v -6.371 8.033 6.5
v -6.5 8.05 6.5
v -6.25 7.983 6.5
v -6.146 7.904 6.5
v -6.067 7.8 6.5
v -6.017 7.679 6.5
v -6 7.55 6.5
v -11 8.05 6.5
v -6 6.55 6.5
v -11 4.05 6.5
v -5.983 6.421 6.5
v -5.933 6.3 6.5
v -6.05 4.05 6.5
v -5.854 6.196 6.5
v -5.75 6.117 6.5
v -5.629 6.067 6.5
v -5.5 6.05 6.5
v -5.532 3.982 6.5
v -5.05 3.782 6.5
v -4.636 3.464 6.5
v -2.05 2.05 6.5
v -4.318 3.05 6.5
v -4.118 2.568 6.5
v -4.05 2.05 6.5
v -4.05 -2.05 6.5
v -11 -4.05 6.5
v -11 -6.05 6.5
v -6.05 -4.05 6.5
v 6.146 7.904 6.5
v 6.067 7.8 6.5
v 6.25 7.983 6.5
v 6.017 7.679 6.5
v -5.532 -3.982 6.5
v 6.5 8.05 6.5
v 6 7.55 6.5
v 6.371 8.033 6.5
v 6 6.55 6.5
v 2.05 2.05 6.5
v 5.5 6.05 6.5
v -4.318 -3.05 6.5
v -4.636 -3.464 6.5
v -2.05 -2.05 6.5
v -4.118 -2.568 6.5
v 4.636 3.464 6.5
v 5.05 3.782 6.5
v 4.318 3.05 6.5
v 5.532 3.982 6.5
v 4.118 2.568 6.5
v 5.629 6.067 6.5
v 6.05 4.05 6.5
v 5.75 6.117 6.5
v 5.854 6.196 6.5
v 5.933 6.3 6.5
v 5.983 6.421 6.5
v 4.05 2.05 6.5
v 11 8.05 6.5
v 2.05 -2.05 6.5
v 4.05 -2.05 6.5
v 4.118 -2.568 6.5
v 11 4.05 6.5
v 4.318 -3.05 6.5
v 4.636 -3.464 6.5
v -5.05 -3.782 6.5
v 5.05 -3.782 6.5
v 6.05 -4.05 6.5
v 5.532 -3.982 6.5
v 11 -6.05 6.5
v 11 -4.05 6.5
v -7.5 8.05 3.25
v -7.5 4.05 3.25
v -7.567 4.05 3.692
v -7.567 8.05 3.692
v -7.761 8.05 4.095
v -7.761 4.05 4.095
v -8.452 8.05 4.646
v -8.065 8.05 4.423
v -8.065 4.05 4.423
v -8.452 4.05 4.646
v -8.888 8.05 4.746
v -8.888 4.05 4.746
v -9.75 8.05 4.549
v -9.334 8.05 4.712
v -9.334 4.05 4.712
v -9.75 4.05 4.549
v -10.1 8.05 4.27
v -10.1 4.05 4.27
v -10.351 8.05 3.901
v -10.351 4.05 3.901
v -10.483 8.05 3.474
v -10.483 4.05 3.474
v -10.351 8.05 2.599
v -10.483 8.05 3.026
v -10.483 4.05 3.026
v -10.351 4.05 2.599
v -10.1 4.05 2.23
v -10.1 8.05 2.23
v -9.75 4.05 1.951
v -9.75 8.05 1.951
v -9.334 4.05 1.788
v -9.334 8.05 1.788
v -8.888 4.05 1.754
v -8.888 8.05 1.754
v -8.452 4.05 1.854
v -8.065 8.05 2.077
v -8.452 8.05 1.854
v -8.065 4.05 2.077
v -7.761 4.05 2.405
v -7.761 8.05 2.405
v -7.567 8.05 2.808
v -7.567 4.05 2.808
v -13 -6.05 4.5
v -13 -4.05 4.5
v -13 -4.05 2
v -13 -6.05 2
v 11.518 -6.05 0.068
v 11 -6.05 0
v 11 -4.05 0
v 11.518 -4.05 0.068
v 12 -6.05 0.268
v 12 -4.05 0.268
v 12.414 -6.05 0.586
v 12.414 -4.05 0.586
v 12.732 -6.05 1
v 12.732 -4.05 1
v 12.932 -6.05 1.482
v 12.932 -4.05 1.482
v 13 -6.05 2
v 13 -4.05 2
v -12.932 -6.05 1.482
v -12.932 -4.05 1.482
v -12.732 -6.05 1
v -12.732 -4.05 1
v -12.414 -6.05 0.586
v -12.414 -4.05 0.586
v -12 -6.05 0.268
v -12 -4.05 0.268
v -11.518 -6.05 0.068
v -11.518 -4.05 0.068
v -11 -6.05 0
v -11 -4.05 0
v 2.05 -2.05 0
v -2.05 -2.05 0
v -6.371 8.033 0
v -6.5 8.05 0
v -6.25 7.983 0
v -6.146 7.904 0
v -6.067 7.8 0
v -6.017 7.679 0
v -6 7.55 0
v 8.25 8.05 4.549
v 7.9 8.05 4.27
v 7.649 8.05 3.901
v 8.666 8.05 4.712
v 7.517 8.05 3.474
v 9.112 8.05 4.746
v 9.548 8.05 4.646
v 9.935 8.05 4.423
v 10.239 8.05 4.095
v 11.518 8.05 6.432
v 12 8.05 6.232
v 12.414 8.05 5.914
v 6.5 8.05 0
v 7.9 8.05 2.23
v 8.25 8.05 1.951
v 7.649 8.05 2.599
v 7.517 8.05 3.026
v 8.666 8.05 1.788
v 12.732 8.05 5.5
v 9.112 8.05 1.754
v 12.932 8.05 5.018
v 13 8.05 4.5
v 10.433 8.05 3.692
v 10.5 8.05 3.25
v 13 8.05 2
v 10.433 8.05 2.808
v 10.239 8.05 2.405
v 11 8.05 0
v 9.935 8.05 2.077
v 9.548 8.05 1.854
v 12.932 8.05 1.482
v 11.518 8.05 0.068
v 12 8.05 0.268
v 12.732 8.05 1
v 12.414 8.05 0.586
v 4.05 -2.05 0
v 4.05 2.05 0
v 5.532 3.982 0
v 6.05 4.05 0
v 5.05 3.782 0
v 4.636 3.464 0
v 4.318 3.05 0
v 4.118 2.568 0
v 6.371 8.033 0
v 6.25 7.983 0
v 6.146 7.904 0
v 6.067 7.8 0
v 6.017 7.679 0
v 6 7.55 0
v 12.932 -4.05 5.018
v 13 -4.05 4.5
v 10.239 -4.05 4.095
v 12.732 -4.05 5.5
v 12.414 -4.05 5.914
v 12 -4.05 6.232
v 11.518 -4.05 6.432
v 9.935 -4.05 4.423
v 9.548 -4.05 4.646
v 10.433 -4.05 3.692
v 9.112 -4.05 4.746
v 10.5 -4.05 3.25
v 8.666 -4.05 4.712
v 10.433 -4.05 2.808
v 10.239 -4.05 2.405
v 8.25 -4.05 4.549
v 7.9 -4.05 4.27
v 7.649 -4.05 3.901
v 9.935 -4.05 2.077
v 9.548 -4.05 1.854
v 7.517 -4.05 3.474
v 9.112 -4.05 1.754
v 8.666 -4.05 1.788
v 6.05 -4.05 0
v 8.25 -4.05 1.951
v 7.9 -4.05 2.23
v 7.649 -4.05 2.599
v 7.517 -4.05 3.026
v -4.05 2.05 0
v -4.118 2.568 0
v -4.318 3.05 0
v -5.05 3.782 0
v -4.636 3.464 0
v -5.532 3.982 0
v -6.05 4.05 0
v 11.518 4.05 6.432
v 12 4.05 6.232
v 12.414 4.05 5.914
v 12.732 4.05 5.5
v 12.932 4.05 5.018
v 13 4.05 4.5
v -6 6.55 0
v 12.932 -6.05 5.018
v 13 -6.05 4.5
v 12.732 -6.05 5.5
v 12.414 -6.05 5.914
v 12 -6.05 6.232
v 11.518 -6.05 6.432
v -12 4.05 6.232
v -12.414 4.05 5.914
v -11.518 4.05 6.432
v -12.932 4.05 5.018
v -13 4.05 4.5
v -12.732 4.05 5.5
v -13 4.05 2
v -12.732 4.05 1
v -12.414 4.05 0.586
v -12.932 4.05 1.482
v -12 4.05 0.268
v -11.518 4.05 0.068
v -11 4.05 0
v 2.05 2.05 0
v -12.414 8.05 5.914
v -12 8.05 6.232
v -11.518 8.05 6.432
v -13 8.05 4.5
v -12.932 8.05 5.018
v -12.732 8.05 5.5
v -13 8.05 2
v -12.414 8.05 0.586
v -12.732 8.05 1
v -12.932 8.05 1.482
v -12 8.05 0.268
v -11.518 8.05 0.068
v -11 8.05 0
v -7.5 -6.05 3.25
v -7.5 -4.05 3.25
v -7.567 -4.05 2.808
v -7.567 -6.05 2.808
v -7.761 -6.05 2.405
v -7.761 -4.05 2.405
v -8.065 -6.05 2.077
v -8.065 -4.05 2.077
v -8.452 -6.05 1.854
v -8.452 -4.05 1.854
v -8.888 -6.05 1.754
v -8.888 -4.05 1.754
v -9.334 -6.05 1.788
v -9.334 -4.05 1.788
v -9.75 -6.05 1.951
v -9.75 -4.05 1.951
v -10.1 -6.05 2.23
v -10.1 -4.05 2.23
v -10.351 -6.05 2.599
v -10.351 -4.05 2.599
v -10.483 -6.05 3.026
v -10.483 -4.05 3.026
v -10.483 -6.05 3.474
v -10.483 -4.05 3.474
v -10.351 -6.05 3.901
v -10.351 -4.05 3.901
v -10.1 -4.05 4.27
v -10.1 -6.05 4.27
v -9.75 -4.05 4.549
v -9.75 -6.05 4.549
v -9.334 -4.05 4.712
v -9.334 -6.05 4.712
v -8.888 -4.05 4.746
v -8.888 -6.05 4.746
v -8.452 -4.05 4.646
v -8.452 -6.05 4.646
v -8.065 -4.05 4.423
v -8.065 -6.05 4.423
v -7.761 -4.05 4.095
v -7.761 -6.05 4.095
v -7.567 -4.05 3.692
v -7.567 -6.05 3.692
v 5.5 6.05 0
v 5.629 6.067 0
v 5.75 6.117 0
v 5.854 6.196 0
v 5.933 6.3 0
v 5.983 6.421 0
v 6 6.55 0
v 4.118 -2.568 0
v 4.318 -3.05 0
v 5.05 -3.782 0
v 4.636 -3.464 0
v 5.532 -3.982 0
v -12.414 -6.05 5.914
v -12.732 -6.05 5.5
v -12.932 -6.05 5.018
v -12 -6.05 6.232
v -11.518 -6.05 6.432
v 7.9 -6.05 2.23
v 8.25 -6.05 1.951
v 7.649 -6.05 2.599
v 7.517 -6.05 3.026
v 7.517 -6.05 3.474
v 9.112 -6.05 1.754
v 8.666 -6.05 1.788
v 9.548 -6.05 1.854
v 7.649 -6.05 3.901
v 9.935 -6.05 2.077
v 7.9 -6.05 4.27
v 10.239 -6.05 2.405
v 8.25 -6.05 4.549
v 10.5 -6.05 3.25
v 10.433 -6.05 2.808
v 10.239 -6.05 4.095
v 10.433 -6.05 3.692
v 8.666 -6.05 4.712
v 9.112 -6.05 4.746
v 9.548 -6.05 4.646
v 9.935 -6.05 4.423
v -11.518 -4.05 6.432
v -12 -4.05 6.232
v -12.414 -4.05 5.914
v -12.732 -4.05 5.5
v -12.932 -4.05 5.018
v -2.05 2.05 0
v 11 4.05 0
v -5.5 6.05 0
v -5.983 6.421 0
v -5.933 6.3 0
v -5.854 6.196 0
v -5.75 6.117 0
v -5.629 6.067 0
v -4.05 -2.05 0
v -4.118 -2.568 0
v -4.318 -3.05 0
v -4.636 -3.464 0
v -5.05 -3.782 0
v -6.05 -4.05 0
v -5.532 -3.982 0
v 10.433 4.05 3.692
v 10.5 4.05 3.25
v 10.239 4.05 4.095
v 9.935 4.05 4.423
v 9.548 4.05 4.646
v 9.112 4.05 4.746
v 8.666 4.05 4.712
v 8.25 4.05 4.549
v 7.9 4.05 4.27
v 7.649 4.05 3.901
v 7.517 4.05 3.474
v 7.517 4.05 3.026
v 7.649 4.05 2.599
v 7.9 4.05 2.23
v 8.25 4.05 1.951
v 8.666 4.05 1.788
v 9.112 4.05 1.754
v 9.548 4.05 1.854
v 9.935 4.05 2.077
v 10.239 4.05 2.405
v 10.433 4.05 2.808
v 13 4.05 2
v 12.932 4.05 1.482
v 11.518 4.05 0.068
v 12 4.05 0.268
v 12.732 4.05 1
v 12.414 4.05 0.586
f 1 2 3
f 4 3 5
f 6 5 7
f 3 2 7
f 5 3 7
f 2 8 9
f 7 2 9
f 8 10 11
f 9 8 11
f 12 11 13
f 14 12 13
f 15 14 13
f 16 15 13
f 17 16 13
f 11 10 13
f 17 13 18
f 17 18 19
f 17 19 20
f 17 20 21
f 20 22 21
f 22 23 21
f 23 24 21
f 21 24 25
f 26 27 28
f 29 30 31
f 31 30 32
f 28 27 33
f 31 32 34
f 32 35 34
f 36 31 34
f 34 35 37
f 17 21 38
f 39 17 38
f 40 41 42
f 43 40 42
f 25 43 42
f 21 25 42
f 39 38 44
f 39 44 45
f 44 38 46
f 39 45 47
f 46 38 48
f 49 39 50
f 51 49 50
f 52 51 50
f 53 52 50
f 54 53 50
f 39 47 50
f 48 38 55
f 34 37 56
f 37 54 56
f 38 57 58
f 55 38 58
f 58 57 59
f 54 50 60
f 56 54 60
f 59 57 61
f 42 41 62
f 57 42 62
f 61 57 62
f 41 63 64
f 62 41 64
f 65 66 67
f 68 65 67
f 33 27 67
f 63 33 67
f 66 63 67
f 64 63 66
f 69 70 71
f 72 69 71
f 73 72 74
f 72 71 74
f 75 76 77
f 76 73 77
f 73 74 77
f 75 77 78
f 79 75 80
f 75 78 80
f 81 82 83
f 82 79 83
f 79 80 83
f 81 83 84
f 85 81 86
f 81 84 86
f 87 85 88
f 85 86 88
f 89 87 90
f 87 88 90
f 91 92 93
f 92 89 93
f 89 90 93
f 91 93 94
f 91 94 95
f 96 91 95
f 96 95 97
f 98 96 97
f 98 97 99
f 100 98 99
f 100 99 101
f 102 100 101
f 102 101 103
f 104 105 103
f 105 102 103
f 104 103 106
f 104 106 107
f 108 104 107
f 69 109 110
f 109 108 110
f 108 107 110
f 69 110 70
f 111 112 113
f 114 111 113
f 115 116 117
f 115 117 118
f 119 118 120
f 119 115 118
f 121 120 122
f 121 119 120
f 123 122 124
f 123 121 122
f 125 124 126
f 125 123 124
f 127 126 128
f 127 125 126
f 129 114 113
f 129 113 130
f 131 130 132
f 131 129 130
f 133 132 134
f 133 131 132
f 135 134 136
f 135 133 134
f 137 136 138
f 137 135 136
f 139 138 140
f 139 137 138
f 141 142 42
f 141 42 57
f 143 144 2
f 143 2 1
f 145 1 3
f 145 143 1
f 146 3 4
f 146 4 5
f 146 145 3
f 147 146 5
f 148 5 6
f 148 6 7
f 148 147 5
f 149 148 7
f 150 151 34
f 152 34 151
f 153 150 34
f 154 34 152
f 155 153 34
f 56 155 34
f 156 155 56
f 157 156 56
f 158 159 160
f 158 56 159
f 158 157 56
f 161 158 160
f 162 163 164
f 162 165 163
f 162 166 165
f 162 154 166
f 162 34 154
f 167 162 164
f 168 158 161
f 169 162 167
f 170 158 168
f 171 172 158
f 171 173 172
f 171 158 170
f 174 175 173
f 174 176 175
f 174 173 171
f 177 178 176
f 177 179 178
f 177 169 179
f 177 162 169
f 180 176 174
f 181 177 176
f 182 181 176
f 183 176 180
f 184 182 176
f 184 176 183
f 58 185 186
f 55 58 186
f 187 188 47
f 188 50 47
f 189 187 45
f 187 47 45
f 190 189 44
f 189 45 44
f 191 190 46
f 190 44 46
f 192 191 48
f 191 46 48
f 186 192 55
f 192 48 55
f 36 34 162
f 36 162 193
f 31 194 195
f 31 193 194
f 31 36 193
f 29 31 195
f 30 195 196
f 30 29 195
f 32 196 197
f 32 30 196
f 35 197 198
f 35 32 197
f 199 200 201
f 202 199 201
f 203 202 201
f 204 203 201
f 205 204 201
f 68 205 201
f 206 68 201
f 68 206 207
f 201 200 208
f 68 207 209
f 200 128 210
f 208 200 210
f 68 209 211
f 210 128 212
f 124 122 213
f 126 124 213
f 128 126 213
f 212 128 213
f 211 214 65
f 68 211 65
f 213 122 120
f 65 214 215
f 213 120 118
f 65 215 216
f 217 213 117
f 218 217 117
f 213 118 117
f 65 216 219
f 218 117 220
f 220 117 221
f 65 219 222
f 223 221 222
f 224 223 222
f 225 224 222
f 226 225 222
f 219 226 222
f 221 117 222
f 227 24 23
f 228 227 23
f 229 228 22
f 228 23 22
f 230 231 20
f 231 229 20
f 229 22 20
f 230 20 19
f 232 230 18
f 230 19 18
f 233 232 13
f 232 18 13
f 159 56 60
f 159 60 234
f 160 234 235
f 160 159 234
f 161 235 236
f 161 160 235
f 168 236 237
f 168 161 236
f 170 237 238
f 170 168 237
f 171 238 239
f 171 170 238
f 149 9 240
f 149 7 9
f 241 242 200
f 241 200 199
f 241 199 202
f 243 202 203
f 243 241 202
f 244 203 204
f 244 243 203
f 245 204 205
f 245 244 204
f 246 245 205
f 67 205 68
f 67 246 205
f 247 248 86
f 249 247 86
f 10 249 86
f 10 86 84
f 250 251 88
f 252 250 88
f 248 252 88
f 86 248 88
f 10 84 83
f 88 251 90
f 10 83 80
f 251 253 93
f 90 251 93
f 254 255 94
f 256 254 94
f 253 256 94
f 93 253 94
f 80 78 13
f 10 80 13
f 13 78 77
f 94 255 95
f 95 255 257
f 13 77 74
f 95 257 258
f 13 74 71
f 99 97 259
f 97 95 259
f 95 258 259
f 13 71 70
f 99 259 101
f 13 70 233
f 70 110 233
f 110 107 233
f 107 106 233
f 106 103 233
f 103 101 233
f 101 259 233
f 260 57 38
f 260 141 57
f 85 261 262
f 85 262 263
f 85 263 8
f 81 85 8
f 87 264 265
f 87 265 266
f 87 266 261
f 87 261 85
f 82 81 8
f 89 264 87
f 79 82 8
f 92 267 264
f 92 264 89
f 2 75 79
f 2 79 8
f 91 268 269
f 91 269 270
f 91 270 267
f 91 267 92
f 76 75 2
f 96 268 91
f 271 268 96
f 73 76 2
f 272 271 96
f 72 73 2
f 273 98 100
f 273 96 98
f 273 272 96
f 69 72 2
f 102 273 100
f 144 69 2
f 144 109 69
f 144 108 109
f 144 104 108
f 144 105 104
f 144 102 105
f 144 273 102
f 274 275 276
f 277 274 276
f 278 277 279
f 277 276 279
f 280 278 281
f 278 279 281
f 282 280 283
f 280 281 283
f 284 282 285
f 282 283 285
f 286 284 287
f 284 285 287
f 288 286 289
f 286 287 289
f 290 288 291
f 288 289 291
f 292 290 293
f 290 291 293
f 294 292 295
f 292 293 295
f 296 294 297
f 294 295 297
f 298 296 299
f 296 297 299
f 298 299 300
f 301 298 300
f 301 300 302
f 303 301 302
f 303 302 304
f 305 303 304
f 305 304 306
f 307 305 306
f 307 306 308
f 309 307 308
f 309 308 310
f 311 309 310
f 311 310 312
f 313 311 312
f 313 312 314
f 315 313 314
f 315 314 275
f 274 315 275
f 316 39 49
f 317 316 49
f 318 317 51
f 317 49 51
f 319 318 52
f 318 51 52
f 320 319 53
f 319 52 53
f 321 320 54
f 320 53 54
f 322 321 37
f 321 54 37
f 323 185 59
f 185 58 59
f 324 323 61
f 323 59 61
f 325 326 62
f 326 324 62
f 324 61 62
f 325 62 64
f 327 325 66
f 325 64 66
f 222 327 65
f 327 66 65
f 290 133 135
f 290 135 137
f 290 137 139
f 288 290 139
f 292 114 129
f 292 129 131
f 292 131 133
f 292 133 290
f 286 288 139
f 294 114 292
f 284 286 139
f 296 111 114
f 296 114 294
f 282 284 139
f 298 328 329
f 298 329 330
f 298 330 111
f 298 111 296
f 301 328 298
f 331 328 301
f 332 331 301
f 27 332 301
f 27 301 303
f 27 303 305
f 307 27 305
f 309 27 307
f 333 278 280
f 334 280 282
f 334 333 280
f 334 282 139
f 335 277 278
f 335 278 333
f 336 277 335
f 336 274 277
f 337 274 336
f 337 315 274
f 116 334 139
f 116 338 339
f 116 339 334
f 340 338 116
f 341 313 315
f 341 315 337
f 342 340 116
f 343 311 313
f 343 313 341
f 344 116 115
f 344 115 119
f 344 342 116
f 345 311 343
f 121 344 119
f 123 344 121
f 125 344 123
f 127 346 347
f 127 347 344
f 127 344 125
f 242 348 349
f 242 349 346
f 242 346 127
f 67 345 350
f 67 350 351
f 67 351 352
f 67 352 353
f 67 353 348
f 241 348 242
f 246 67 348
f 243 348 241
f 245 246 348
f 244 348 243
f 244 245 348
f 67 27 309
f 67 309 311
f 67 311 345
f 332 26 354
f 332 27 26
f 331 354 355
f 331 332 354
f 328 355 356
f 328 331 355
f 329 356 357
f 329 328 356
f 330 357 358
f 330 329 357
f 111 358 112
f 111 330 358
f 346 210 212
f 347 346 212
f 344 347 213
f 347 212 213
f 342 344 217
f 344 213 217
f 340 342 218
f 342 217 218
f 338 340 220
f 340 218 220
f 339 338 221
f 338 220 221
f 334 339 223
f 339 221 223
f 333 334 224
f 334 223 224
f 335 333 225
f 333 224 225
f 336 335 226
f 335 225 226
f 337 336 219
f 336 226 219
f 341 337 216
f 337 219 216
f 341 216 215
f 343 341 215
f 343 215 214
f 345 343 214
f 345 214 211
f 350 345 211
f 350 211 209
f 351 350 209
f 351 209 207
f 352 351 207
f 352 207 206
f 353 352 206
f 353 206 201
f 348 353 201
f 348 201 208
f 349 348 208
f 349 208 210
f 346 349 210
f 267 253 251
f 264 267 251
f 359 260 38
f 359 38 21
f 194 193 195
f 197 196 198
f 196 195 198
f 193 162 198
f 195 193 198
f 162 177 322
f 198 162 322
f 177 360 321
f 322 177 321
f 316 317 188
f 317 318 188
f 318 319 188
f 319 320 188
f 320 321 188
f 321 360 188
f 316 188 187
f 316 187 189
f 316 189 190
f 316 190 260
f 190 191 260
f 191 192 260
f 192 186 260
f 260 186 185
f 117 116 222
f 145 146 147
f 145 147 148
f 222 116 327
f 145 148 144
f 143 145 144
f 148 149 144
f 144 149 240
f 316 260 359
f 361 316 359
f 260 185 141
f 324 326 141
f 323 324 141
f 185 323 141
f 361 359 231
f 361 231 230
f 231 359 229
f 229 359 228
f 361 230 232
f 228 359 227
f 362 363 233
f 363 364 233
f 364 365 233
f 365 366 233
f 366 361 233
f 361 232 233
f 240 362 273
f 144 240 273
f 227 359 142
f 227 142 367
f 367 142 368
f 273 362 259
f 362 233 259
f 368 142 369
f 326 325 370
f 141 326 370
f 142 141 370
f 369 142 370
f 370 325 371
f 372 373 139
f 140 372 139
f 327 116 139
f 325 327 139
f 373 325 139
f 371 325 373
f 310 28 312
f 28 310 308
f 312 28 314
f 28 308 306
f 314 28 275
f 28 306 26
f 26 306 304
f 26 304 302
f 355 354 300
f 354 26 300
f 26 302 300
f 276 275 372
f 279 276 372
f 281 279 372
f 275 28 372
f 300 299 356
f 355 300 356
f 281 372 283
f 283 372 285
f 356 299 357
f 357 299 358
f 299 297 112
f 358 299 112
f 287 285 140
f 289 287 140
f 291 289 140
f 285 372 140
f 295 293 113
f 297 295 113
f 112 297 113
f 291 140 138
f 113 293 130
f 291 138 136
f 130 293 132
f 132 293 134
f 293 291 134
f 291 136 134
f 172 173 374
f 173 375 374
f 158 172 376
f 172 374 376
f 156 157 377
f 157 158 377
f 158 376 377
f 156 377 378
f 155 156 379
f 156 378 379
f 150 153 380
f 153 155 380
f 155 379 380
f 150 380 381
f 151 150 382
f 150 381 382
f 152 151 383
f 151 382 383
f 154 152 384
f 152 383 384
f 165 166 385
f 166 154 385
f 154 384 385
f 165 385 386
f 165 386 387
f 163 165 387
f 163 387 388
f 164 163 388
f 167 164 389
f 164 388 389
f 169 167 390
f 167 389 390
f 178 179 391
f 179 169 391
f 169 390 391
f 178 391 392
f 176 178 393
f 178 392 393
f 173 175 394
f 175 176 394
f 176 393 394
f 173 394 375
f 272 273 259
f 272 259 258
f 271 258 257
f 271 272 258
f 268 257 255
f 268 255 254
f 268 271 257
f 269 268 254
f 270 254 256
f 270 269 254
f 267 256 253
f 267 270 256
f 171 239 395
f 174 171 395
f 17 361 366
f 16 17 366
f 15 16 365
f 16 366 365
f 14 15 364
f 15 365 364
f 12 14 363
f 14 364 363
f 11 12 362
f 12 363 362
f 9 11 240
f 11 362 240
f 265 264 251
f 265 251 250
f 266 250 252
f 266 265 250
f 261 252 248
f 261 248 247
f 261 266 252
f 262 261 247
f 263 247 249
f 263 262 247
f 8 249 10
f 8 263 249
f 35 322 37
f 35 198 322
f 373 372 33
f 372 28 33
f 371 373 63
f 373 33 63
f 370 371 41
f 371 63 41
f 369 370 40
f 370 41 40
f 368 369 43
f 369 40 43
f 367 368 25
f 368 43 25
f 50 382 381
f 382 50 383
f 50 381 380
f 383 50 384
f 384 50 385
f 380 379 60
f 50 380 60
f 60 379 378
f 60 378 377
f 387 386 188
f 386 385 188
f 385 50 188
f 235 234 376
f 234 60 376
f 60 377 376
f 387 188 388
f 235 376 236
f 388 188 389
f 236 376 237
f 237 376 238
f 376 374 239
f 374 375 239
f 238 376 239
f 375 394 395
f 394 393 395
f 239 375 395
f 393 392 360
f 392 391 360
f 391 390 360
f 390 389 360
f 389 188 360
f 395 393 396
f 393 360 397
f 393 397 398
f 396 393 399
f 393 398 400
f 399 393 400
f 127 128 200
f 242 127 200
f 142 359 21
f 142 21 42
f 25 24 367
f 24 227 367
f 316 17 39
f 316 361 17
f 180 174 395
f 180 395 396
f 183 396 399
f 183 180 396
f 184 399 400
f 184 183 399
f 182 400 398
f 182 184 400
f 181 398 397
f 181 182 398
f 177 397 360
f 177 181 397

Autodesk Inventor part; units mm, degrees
ref_plane "YZ Plane" through (0, 0, 0) normal (1, 0, 0) x (0, 1, 0)
ref_plane "XZ Plane" through (0, 0, 0) normal (0, 1, 0) x (-1, 0, 0)
ref_plane "XY Plane" through (0, 0, 0) normal (0, 0, 1) x (1, 0, 0)
sketch "Sketch1" plane through (0, 0, 0) normal (0, 0, 1) x (1, 0, 0)
  line L0 (2.05, 2.05) -> (-2.05, 2.05)
  line L1 (-2.05, 2.05) -> (-2.05, -2.05)
  line L2 (-2.05, -2.05) -> (2.05, -2.05)
  line L3 (2.05, -2.05) -> (2.05, 2.05)
  line L4 (2.05, 2.05) -> (-2.05, -2.05) construction
  line L5 (-2.05, 2.05) -> (2.05, -2.05) construction
  line L6 (4.05, 4.05) -> (-4.05, 4.05)
  line L7 (-4.05, 4.05) -> (-4.05, -4.05)
  line L8 (-4.05, -4.05) -> (4.05, -4.05)
  line L9 (4.05, -4.05) -> (4.05, 4.05)
  line L10 (4.05, 4.05) -> (-4.05, -4.05) construction
  line L11 (-4.05, 4.05) -> (4.05, -4.05) construction
  point P0 (0, 0)
  point P1 (0, 0)
  point P2 (0, 0)
  point P3 (0, 0)
  dimension "d24" = 8.1
  dimension "d25" = 4.1
  dimension "d26" = 8.1
extrude "Extrusion1" add sketch "Sketch1" along normal blind 6.5
sketch "Sketch2" plane through (-5.0868, 4.05, 0) normal (0, 1, 0) x (1, 0, 0)
  circle A0 centre (14.0868, -3.25) radius 1.5
  circle A1 centre (-3.9132, -3.25) radius 1.5
  line L0 (12, 0) -> (0, 0) projected
  line L1 (12, -6.5) -> (0, -6.5) projected
  line L2 (-7.9132, -6.5) -> (18.0868, -6.5)
  line L3 (18.0868, -6.5) -> (18.0868, 0)
  line L4 (18.0868, 0) -> (-7.9132, 0)
  line L5 (-7.9132, 0) -> (-7.9132, -6.5)
  line L6 (5.0868, -6.5) -> (5.0868, 0) construction
  line L7 (1.0368, 0) -> (1.0368, -6.5) projected
  line L8 (9.1368, 0) -> (9.1368, -6.5) projected
  point P0 (5.0868, 0)
  dimension "d8" = 3
  dimension "d9" = 3
  dimension "d10" = 18
  dimension "d11" = 6.5
  dimension "d14" = 4
  dimension "d15" = 4
  dimension "d16" = 3.25
  dimension "d17" = 3.25
  dimension "d18" = 0
  dimension "d23" = 3.25
  dimension "d30" = 26
  dimension "d31" = 8.1
  dimension "d32" = 8.95
extrude "Extrusion2" add sketch "Sketch2" along normal blind 4
fillet "Fillet1" radius 2 2 edges at (4.05, 4.05, 3.25) (-4.05, 4.05, 3.25)
fillet "Fillet2" radius 2 2 edges at (-4.05, -4.05, 3.25) (4.05, -4.05, 3.25)
fillet "Fillet3" radius 2 4 edges at (-13, 6.05, 6.5) (13, 6.05, 6.5) (13, 6.05, 0) (-13, 6.05, 0)
sketch "Sketch3" plane through (-5.0868, 8.05, 0) normal (0, 1, 0) x (1, 0, 0)
  line L0 (-5.9132, -6.5) -> (16.0868, -6.5) projected
  line L1 (16.0868, 0) -> (-5.9132, 0) projected
  line L2 (11.0868, -6.5) -> (-0.9132, -6.5)
  line L3 (-0.9132, -6.5) -> (-0.9132, 0)
  line L4 (-0.9132, 0) -> (11.0868, 0)
  line L5 (11.0868, 0) -> (11.0868, -6.5)
  line L6 (-7.9132, -2) -> (-7.9132, -4.5) projected
  line L7 (18.0868, -4.5) -> (18.0868, -2) projected
  point P0 (5.0868, 0)
  point P1 (11.0868, 0)
  point P2 (-0.9132, -6.5)
  dimension "d33" = 7
  dimension "d34" = 7
extrude "Extrusion3" cut sketch "Sketch3" against normal blind 2
fillet "Fillet4" radius 0.5 4 edges at (6, 8.05, 3.25) (-6, 8.05, 3.25) (-6, 6.05, 3.25) (6, 6.05, 3.25)
mirror "Mirror1" about plane through (0, 0, 0) normal (0, 1, 0)
sketch "Sketch5" plane through (6.5, -8.05, 0) normal (0, -1, 0) x (1, 0, 0)
  line L0 (12.0758, -8.2102) -> (-27.8852, -8.2102)
  line L1 (-27.8852, -8.2102) -> (-27.8852, 11.7461)
  line L2 (-27.8852, 11.7461) -> (12.0758, 11.7461)
  line L3 (12.0758, 11.7461) -> (12.0758, -8.2102)
  point P0 (-6.5, 0)
extrude "Extrusion4" cut sketch "Sketch5" against normal up to surface (2 mm away)
equation "\"d16\" = d17"
equation "\"d23\" = d17"
equation "\"d32\" = -0.5 * d31 + 0.5 * d30"
properties part number "fuselage_CM904_interface" material "ABS Plastic"
